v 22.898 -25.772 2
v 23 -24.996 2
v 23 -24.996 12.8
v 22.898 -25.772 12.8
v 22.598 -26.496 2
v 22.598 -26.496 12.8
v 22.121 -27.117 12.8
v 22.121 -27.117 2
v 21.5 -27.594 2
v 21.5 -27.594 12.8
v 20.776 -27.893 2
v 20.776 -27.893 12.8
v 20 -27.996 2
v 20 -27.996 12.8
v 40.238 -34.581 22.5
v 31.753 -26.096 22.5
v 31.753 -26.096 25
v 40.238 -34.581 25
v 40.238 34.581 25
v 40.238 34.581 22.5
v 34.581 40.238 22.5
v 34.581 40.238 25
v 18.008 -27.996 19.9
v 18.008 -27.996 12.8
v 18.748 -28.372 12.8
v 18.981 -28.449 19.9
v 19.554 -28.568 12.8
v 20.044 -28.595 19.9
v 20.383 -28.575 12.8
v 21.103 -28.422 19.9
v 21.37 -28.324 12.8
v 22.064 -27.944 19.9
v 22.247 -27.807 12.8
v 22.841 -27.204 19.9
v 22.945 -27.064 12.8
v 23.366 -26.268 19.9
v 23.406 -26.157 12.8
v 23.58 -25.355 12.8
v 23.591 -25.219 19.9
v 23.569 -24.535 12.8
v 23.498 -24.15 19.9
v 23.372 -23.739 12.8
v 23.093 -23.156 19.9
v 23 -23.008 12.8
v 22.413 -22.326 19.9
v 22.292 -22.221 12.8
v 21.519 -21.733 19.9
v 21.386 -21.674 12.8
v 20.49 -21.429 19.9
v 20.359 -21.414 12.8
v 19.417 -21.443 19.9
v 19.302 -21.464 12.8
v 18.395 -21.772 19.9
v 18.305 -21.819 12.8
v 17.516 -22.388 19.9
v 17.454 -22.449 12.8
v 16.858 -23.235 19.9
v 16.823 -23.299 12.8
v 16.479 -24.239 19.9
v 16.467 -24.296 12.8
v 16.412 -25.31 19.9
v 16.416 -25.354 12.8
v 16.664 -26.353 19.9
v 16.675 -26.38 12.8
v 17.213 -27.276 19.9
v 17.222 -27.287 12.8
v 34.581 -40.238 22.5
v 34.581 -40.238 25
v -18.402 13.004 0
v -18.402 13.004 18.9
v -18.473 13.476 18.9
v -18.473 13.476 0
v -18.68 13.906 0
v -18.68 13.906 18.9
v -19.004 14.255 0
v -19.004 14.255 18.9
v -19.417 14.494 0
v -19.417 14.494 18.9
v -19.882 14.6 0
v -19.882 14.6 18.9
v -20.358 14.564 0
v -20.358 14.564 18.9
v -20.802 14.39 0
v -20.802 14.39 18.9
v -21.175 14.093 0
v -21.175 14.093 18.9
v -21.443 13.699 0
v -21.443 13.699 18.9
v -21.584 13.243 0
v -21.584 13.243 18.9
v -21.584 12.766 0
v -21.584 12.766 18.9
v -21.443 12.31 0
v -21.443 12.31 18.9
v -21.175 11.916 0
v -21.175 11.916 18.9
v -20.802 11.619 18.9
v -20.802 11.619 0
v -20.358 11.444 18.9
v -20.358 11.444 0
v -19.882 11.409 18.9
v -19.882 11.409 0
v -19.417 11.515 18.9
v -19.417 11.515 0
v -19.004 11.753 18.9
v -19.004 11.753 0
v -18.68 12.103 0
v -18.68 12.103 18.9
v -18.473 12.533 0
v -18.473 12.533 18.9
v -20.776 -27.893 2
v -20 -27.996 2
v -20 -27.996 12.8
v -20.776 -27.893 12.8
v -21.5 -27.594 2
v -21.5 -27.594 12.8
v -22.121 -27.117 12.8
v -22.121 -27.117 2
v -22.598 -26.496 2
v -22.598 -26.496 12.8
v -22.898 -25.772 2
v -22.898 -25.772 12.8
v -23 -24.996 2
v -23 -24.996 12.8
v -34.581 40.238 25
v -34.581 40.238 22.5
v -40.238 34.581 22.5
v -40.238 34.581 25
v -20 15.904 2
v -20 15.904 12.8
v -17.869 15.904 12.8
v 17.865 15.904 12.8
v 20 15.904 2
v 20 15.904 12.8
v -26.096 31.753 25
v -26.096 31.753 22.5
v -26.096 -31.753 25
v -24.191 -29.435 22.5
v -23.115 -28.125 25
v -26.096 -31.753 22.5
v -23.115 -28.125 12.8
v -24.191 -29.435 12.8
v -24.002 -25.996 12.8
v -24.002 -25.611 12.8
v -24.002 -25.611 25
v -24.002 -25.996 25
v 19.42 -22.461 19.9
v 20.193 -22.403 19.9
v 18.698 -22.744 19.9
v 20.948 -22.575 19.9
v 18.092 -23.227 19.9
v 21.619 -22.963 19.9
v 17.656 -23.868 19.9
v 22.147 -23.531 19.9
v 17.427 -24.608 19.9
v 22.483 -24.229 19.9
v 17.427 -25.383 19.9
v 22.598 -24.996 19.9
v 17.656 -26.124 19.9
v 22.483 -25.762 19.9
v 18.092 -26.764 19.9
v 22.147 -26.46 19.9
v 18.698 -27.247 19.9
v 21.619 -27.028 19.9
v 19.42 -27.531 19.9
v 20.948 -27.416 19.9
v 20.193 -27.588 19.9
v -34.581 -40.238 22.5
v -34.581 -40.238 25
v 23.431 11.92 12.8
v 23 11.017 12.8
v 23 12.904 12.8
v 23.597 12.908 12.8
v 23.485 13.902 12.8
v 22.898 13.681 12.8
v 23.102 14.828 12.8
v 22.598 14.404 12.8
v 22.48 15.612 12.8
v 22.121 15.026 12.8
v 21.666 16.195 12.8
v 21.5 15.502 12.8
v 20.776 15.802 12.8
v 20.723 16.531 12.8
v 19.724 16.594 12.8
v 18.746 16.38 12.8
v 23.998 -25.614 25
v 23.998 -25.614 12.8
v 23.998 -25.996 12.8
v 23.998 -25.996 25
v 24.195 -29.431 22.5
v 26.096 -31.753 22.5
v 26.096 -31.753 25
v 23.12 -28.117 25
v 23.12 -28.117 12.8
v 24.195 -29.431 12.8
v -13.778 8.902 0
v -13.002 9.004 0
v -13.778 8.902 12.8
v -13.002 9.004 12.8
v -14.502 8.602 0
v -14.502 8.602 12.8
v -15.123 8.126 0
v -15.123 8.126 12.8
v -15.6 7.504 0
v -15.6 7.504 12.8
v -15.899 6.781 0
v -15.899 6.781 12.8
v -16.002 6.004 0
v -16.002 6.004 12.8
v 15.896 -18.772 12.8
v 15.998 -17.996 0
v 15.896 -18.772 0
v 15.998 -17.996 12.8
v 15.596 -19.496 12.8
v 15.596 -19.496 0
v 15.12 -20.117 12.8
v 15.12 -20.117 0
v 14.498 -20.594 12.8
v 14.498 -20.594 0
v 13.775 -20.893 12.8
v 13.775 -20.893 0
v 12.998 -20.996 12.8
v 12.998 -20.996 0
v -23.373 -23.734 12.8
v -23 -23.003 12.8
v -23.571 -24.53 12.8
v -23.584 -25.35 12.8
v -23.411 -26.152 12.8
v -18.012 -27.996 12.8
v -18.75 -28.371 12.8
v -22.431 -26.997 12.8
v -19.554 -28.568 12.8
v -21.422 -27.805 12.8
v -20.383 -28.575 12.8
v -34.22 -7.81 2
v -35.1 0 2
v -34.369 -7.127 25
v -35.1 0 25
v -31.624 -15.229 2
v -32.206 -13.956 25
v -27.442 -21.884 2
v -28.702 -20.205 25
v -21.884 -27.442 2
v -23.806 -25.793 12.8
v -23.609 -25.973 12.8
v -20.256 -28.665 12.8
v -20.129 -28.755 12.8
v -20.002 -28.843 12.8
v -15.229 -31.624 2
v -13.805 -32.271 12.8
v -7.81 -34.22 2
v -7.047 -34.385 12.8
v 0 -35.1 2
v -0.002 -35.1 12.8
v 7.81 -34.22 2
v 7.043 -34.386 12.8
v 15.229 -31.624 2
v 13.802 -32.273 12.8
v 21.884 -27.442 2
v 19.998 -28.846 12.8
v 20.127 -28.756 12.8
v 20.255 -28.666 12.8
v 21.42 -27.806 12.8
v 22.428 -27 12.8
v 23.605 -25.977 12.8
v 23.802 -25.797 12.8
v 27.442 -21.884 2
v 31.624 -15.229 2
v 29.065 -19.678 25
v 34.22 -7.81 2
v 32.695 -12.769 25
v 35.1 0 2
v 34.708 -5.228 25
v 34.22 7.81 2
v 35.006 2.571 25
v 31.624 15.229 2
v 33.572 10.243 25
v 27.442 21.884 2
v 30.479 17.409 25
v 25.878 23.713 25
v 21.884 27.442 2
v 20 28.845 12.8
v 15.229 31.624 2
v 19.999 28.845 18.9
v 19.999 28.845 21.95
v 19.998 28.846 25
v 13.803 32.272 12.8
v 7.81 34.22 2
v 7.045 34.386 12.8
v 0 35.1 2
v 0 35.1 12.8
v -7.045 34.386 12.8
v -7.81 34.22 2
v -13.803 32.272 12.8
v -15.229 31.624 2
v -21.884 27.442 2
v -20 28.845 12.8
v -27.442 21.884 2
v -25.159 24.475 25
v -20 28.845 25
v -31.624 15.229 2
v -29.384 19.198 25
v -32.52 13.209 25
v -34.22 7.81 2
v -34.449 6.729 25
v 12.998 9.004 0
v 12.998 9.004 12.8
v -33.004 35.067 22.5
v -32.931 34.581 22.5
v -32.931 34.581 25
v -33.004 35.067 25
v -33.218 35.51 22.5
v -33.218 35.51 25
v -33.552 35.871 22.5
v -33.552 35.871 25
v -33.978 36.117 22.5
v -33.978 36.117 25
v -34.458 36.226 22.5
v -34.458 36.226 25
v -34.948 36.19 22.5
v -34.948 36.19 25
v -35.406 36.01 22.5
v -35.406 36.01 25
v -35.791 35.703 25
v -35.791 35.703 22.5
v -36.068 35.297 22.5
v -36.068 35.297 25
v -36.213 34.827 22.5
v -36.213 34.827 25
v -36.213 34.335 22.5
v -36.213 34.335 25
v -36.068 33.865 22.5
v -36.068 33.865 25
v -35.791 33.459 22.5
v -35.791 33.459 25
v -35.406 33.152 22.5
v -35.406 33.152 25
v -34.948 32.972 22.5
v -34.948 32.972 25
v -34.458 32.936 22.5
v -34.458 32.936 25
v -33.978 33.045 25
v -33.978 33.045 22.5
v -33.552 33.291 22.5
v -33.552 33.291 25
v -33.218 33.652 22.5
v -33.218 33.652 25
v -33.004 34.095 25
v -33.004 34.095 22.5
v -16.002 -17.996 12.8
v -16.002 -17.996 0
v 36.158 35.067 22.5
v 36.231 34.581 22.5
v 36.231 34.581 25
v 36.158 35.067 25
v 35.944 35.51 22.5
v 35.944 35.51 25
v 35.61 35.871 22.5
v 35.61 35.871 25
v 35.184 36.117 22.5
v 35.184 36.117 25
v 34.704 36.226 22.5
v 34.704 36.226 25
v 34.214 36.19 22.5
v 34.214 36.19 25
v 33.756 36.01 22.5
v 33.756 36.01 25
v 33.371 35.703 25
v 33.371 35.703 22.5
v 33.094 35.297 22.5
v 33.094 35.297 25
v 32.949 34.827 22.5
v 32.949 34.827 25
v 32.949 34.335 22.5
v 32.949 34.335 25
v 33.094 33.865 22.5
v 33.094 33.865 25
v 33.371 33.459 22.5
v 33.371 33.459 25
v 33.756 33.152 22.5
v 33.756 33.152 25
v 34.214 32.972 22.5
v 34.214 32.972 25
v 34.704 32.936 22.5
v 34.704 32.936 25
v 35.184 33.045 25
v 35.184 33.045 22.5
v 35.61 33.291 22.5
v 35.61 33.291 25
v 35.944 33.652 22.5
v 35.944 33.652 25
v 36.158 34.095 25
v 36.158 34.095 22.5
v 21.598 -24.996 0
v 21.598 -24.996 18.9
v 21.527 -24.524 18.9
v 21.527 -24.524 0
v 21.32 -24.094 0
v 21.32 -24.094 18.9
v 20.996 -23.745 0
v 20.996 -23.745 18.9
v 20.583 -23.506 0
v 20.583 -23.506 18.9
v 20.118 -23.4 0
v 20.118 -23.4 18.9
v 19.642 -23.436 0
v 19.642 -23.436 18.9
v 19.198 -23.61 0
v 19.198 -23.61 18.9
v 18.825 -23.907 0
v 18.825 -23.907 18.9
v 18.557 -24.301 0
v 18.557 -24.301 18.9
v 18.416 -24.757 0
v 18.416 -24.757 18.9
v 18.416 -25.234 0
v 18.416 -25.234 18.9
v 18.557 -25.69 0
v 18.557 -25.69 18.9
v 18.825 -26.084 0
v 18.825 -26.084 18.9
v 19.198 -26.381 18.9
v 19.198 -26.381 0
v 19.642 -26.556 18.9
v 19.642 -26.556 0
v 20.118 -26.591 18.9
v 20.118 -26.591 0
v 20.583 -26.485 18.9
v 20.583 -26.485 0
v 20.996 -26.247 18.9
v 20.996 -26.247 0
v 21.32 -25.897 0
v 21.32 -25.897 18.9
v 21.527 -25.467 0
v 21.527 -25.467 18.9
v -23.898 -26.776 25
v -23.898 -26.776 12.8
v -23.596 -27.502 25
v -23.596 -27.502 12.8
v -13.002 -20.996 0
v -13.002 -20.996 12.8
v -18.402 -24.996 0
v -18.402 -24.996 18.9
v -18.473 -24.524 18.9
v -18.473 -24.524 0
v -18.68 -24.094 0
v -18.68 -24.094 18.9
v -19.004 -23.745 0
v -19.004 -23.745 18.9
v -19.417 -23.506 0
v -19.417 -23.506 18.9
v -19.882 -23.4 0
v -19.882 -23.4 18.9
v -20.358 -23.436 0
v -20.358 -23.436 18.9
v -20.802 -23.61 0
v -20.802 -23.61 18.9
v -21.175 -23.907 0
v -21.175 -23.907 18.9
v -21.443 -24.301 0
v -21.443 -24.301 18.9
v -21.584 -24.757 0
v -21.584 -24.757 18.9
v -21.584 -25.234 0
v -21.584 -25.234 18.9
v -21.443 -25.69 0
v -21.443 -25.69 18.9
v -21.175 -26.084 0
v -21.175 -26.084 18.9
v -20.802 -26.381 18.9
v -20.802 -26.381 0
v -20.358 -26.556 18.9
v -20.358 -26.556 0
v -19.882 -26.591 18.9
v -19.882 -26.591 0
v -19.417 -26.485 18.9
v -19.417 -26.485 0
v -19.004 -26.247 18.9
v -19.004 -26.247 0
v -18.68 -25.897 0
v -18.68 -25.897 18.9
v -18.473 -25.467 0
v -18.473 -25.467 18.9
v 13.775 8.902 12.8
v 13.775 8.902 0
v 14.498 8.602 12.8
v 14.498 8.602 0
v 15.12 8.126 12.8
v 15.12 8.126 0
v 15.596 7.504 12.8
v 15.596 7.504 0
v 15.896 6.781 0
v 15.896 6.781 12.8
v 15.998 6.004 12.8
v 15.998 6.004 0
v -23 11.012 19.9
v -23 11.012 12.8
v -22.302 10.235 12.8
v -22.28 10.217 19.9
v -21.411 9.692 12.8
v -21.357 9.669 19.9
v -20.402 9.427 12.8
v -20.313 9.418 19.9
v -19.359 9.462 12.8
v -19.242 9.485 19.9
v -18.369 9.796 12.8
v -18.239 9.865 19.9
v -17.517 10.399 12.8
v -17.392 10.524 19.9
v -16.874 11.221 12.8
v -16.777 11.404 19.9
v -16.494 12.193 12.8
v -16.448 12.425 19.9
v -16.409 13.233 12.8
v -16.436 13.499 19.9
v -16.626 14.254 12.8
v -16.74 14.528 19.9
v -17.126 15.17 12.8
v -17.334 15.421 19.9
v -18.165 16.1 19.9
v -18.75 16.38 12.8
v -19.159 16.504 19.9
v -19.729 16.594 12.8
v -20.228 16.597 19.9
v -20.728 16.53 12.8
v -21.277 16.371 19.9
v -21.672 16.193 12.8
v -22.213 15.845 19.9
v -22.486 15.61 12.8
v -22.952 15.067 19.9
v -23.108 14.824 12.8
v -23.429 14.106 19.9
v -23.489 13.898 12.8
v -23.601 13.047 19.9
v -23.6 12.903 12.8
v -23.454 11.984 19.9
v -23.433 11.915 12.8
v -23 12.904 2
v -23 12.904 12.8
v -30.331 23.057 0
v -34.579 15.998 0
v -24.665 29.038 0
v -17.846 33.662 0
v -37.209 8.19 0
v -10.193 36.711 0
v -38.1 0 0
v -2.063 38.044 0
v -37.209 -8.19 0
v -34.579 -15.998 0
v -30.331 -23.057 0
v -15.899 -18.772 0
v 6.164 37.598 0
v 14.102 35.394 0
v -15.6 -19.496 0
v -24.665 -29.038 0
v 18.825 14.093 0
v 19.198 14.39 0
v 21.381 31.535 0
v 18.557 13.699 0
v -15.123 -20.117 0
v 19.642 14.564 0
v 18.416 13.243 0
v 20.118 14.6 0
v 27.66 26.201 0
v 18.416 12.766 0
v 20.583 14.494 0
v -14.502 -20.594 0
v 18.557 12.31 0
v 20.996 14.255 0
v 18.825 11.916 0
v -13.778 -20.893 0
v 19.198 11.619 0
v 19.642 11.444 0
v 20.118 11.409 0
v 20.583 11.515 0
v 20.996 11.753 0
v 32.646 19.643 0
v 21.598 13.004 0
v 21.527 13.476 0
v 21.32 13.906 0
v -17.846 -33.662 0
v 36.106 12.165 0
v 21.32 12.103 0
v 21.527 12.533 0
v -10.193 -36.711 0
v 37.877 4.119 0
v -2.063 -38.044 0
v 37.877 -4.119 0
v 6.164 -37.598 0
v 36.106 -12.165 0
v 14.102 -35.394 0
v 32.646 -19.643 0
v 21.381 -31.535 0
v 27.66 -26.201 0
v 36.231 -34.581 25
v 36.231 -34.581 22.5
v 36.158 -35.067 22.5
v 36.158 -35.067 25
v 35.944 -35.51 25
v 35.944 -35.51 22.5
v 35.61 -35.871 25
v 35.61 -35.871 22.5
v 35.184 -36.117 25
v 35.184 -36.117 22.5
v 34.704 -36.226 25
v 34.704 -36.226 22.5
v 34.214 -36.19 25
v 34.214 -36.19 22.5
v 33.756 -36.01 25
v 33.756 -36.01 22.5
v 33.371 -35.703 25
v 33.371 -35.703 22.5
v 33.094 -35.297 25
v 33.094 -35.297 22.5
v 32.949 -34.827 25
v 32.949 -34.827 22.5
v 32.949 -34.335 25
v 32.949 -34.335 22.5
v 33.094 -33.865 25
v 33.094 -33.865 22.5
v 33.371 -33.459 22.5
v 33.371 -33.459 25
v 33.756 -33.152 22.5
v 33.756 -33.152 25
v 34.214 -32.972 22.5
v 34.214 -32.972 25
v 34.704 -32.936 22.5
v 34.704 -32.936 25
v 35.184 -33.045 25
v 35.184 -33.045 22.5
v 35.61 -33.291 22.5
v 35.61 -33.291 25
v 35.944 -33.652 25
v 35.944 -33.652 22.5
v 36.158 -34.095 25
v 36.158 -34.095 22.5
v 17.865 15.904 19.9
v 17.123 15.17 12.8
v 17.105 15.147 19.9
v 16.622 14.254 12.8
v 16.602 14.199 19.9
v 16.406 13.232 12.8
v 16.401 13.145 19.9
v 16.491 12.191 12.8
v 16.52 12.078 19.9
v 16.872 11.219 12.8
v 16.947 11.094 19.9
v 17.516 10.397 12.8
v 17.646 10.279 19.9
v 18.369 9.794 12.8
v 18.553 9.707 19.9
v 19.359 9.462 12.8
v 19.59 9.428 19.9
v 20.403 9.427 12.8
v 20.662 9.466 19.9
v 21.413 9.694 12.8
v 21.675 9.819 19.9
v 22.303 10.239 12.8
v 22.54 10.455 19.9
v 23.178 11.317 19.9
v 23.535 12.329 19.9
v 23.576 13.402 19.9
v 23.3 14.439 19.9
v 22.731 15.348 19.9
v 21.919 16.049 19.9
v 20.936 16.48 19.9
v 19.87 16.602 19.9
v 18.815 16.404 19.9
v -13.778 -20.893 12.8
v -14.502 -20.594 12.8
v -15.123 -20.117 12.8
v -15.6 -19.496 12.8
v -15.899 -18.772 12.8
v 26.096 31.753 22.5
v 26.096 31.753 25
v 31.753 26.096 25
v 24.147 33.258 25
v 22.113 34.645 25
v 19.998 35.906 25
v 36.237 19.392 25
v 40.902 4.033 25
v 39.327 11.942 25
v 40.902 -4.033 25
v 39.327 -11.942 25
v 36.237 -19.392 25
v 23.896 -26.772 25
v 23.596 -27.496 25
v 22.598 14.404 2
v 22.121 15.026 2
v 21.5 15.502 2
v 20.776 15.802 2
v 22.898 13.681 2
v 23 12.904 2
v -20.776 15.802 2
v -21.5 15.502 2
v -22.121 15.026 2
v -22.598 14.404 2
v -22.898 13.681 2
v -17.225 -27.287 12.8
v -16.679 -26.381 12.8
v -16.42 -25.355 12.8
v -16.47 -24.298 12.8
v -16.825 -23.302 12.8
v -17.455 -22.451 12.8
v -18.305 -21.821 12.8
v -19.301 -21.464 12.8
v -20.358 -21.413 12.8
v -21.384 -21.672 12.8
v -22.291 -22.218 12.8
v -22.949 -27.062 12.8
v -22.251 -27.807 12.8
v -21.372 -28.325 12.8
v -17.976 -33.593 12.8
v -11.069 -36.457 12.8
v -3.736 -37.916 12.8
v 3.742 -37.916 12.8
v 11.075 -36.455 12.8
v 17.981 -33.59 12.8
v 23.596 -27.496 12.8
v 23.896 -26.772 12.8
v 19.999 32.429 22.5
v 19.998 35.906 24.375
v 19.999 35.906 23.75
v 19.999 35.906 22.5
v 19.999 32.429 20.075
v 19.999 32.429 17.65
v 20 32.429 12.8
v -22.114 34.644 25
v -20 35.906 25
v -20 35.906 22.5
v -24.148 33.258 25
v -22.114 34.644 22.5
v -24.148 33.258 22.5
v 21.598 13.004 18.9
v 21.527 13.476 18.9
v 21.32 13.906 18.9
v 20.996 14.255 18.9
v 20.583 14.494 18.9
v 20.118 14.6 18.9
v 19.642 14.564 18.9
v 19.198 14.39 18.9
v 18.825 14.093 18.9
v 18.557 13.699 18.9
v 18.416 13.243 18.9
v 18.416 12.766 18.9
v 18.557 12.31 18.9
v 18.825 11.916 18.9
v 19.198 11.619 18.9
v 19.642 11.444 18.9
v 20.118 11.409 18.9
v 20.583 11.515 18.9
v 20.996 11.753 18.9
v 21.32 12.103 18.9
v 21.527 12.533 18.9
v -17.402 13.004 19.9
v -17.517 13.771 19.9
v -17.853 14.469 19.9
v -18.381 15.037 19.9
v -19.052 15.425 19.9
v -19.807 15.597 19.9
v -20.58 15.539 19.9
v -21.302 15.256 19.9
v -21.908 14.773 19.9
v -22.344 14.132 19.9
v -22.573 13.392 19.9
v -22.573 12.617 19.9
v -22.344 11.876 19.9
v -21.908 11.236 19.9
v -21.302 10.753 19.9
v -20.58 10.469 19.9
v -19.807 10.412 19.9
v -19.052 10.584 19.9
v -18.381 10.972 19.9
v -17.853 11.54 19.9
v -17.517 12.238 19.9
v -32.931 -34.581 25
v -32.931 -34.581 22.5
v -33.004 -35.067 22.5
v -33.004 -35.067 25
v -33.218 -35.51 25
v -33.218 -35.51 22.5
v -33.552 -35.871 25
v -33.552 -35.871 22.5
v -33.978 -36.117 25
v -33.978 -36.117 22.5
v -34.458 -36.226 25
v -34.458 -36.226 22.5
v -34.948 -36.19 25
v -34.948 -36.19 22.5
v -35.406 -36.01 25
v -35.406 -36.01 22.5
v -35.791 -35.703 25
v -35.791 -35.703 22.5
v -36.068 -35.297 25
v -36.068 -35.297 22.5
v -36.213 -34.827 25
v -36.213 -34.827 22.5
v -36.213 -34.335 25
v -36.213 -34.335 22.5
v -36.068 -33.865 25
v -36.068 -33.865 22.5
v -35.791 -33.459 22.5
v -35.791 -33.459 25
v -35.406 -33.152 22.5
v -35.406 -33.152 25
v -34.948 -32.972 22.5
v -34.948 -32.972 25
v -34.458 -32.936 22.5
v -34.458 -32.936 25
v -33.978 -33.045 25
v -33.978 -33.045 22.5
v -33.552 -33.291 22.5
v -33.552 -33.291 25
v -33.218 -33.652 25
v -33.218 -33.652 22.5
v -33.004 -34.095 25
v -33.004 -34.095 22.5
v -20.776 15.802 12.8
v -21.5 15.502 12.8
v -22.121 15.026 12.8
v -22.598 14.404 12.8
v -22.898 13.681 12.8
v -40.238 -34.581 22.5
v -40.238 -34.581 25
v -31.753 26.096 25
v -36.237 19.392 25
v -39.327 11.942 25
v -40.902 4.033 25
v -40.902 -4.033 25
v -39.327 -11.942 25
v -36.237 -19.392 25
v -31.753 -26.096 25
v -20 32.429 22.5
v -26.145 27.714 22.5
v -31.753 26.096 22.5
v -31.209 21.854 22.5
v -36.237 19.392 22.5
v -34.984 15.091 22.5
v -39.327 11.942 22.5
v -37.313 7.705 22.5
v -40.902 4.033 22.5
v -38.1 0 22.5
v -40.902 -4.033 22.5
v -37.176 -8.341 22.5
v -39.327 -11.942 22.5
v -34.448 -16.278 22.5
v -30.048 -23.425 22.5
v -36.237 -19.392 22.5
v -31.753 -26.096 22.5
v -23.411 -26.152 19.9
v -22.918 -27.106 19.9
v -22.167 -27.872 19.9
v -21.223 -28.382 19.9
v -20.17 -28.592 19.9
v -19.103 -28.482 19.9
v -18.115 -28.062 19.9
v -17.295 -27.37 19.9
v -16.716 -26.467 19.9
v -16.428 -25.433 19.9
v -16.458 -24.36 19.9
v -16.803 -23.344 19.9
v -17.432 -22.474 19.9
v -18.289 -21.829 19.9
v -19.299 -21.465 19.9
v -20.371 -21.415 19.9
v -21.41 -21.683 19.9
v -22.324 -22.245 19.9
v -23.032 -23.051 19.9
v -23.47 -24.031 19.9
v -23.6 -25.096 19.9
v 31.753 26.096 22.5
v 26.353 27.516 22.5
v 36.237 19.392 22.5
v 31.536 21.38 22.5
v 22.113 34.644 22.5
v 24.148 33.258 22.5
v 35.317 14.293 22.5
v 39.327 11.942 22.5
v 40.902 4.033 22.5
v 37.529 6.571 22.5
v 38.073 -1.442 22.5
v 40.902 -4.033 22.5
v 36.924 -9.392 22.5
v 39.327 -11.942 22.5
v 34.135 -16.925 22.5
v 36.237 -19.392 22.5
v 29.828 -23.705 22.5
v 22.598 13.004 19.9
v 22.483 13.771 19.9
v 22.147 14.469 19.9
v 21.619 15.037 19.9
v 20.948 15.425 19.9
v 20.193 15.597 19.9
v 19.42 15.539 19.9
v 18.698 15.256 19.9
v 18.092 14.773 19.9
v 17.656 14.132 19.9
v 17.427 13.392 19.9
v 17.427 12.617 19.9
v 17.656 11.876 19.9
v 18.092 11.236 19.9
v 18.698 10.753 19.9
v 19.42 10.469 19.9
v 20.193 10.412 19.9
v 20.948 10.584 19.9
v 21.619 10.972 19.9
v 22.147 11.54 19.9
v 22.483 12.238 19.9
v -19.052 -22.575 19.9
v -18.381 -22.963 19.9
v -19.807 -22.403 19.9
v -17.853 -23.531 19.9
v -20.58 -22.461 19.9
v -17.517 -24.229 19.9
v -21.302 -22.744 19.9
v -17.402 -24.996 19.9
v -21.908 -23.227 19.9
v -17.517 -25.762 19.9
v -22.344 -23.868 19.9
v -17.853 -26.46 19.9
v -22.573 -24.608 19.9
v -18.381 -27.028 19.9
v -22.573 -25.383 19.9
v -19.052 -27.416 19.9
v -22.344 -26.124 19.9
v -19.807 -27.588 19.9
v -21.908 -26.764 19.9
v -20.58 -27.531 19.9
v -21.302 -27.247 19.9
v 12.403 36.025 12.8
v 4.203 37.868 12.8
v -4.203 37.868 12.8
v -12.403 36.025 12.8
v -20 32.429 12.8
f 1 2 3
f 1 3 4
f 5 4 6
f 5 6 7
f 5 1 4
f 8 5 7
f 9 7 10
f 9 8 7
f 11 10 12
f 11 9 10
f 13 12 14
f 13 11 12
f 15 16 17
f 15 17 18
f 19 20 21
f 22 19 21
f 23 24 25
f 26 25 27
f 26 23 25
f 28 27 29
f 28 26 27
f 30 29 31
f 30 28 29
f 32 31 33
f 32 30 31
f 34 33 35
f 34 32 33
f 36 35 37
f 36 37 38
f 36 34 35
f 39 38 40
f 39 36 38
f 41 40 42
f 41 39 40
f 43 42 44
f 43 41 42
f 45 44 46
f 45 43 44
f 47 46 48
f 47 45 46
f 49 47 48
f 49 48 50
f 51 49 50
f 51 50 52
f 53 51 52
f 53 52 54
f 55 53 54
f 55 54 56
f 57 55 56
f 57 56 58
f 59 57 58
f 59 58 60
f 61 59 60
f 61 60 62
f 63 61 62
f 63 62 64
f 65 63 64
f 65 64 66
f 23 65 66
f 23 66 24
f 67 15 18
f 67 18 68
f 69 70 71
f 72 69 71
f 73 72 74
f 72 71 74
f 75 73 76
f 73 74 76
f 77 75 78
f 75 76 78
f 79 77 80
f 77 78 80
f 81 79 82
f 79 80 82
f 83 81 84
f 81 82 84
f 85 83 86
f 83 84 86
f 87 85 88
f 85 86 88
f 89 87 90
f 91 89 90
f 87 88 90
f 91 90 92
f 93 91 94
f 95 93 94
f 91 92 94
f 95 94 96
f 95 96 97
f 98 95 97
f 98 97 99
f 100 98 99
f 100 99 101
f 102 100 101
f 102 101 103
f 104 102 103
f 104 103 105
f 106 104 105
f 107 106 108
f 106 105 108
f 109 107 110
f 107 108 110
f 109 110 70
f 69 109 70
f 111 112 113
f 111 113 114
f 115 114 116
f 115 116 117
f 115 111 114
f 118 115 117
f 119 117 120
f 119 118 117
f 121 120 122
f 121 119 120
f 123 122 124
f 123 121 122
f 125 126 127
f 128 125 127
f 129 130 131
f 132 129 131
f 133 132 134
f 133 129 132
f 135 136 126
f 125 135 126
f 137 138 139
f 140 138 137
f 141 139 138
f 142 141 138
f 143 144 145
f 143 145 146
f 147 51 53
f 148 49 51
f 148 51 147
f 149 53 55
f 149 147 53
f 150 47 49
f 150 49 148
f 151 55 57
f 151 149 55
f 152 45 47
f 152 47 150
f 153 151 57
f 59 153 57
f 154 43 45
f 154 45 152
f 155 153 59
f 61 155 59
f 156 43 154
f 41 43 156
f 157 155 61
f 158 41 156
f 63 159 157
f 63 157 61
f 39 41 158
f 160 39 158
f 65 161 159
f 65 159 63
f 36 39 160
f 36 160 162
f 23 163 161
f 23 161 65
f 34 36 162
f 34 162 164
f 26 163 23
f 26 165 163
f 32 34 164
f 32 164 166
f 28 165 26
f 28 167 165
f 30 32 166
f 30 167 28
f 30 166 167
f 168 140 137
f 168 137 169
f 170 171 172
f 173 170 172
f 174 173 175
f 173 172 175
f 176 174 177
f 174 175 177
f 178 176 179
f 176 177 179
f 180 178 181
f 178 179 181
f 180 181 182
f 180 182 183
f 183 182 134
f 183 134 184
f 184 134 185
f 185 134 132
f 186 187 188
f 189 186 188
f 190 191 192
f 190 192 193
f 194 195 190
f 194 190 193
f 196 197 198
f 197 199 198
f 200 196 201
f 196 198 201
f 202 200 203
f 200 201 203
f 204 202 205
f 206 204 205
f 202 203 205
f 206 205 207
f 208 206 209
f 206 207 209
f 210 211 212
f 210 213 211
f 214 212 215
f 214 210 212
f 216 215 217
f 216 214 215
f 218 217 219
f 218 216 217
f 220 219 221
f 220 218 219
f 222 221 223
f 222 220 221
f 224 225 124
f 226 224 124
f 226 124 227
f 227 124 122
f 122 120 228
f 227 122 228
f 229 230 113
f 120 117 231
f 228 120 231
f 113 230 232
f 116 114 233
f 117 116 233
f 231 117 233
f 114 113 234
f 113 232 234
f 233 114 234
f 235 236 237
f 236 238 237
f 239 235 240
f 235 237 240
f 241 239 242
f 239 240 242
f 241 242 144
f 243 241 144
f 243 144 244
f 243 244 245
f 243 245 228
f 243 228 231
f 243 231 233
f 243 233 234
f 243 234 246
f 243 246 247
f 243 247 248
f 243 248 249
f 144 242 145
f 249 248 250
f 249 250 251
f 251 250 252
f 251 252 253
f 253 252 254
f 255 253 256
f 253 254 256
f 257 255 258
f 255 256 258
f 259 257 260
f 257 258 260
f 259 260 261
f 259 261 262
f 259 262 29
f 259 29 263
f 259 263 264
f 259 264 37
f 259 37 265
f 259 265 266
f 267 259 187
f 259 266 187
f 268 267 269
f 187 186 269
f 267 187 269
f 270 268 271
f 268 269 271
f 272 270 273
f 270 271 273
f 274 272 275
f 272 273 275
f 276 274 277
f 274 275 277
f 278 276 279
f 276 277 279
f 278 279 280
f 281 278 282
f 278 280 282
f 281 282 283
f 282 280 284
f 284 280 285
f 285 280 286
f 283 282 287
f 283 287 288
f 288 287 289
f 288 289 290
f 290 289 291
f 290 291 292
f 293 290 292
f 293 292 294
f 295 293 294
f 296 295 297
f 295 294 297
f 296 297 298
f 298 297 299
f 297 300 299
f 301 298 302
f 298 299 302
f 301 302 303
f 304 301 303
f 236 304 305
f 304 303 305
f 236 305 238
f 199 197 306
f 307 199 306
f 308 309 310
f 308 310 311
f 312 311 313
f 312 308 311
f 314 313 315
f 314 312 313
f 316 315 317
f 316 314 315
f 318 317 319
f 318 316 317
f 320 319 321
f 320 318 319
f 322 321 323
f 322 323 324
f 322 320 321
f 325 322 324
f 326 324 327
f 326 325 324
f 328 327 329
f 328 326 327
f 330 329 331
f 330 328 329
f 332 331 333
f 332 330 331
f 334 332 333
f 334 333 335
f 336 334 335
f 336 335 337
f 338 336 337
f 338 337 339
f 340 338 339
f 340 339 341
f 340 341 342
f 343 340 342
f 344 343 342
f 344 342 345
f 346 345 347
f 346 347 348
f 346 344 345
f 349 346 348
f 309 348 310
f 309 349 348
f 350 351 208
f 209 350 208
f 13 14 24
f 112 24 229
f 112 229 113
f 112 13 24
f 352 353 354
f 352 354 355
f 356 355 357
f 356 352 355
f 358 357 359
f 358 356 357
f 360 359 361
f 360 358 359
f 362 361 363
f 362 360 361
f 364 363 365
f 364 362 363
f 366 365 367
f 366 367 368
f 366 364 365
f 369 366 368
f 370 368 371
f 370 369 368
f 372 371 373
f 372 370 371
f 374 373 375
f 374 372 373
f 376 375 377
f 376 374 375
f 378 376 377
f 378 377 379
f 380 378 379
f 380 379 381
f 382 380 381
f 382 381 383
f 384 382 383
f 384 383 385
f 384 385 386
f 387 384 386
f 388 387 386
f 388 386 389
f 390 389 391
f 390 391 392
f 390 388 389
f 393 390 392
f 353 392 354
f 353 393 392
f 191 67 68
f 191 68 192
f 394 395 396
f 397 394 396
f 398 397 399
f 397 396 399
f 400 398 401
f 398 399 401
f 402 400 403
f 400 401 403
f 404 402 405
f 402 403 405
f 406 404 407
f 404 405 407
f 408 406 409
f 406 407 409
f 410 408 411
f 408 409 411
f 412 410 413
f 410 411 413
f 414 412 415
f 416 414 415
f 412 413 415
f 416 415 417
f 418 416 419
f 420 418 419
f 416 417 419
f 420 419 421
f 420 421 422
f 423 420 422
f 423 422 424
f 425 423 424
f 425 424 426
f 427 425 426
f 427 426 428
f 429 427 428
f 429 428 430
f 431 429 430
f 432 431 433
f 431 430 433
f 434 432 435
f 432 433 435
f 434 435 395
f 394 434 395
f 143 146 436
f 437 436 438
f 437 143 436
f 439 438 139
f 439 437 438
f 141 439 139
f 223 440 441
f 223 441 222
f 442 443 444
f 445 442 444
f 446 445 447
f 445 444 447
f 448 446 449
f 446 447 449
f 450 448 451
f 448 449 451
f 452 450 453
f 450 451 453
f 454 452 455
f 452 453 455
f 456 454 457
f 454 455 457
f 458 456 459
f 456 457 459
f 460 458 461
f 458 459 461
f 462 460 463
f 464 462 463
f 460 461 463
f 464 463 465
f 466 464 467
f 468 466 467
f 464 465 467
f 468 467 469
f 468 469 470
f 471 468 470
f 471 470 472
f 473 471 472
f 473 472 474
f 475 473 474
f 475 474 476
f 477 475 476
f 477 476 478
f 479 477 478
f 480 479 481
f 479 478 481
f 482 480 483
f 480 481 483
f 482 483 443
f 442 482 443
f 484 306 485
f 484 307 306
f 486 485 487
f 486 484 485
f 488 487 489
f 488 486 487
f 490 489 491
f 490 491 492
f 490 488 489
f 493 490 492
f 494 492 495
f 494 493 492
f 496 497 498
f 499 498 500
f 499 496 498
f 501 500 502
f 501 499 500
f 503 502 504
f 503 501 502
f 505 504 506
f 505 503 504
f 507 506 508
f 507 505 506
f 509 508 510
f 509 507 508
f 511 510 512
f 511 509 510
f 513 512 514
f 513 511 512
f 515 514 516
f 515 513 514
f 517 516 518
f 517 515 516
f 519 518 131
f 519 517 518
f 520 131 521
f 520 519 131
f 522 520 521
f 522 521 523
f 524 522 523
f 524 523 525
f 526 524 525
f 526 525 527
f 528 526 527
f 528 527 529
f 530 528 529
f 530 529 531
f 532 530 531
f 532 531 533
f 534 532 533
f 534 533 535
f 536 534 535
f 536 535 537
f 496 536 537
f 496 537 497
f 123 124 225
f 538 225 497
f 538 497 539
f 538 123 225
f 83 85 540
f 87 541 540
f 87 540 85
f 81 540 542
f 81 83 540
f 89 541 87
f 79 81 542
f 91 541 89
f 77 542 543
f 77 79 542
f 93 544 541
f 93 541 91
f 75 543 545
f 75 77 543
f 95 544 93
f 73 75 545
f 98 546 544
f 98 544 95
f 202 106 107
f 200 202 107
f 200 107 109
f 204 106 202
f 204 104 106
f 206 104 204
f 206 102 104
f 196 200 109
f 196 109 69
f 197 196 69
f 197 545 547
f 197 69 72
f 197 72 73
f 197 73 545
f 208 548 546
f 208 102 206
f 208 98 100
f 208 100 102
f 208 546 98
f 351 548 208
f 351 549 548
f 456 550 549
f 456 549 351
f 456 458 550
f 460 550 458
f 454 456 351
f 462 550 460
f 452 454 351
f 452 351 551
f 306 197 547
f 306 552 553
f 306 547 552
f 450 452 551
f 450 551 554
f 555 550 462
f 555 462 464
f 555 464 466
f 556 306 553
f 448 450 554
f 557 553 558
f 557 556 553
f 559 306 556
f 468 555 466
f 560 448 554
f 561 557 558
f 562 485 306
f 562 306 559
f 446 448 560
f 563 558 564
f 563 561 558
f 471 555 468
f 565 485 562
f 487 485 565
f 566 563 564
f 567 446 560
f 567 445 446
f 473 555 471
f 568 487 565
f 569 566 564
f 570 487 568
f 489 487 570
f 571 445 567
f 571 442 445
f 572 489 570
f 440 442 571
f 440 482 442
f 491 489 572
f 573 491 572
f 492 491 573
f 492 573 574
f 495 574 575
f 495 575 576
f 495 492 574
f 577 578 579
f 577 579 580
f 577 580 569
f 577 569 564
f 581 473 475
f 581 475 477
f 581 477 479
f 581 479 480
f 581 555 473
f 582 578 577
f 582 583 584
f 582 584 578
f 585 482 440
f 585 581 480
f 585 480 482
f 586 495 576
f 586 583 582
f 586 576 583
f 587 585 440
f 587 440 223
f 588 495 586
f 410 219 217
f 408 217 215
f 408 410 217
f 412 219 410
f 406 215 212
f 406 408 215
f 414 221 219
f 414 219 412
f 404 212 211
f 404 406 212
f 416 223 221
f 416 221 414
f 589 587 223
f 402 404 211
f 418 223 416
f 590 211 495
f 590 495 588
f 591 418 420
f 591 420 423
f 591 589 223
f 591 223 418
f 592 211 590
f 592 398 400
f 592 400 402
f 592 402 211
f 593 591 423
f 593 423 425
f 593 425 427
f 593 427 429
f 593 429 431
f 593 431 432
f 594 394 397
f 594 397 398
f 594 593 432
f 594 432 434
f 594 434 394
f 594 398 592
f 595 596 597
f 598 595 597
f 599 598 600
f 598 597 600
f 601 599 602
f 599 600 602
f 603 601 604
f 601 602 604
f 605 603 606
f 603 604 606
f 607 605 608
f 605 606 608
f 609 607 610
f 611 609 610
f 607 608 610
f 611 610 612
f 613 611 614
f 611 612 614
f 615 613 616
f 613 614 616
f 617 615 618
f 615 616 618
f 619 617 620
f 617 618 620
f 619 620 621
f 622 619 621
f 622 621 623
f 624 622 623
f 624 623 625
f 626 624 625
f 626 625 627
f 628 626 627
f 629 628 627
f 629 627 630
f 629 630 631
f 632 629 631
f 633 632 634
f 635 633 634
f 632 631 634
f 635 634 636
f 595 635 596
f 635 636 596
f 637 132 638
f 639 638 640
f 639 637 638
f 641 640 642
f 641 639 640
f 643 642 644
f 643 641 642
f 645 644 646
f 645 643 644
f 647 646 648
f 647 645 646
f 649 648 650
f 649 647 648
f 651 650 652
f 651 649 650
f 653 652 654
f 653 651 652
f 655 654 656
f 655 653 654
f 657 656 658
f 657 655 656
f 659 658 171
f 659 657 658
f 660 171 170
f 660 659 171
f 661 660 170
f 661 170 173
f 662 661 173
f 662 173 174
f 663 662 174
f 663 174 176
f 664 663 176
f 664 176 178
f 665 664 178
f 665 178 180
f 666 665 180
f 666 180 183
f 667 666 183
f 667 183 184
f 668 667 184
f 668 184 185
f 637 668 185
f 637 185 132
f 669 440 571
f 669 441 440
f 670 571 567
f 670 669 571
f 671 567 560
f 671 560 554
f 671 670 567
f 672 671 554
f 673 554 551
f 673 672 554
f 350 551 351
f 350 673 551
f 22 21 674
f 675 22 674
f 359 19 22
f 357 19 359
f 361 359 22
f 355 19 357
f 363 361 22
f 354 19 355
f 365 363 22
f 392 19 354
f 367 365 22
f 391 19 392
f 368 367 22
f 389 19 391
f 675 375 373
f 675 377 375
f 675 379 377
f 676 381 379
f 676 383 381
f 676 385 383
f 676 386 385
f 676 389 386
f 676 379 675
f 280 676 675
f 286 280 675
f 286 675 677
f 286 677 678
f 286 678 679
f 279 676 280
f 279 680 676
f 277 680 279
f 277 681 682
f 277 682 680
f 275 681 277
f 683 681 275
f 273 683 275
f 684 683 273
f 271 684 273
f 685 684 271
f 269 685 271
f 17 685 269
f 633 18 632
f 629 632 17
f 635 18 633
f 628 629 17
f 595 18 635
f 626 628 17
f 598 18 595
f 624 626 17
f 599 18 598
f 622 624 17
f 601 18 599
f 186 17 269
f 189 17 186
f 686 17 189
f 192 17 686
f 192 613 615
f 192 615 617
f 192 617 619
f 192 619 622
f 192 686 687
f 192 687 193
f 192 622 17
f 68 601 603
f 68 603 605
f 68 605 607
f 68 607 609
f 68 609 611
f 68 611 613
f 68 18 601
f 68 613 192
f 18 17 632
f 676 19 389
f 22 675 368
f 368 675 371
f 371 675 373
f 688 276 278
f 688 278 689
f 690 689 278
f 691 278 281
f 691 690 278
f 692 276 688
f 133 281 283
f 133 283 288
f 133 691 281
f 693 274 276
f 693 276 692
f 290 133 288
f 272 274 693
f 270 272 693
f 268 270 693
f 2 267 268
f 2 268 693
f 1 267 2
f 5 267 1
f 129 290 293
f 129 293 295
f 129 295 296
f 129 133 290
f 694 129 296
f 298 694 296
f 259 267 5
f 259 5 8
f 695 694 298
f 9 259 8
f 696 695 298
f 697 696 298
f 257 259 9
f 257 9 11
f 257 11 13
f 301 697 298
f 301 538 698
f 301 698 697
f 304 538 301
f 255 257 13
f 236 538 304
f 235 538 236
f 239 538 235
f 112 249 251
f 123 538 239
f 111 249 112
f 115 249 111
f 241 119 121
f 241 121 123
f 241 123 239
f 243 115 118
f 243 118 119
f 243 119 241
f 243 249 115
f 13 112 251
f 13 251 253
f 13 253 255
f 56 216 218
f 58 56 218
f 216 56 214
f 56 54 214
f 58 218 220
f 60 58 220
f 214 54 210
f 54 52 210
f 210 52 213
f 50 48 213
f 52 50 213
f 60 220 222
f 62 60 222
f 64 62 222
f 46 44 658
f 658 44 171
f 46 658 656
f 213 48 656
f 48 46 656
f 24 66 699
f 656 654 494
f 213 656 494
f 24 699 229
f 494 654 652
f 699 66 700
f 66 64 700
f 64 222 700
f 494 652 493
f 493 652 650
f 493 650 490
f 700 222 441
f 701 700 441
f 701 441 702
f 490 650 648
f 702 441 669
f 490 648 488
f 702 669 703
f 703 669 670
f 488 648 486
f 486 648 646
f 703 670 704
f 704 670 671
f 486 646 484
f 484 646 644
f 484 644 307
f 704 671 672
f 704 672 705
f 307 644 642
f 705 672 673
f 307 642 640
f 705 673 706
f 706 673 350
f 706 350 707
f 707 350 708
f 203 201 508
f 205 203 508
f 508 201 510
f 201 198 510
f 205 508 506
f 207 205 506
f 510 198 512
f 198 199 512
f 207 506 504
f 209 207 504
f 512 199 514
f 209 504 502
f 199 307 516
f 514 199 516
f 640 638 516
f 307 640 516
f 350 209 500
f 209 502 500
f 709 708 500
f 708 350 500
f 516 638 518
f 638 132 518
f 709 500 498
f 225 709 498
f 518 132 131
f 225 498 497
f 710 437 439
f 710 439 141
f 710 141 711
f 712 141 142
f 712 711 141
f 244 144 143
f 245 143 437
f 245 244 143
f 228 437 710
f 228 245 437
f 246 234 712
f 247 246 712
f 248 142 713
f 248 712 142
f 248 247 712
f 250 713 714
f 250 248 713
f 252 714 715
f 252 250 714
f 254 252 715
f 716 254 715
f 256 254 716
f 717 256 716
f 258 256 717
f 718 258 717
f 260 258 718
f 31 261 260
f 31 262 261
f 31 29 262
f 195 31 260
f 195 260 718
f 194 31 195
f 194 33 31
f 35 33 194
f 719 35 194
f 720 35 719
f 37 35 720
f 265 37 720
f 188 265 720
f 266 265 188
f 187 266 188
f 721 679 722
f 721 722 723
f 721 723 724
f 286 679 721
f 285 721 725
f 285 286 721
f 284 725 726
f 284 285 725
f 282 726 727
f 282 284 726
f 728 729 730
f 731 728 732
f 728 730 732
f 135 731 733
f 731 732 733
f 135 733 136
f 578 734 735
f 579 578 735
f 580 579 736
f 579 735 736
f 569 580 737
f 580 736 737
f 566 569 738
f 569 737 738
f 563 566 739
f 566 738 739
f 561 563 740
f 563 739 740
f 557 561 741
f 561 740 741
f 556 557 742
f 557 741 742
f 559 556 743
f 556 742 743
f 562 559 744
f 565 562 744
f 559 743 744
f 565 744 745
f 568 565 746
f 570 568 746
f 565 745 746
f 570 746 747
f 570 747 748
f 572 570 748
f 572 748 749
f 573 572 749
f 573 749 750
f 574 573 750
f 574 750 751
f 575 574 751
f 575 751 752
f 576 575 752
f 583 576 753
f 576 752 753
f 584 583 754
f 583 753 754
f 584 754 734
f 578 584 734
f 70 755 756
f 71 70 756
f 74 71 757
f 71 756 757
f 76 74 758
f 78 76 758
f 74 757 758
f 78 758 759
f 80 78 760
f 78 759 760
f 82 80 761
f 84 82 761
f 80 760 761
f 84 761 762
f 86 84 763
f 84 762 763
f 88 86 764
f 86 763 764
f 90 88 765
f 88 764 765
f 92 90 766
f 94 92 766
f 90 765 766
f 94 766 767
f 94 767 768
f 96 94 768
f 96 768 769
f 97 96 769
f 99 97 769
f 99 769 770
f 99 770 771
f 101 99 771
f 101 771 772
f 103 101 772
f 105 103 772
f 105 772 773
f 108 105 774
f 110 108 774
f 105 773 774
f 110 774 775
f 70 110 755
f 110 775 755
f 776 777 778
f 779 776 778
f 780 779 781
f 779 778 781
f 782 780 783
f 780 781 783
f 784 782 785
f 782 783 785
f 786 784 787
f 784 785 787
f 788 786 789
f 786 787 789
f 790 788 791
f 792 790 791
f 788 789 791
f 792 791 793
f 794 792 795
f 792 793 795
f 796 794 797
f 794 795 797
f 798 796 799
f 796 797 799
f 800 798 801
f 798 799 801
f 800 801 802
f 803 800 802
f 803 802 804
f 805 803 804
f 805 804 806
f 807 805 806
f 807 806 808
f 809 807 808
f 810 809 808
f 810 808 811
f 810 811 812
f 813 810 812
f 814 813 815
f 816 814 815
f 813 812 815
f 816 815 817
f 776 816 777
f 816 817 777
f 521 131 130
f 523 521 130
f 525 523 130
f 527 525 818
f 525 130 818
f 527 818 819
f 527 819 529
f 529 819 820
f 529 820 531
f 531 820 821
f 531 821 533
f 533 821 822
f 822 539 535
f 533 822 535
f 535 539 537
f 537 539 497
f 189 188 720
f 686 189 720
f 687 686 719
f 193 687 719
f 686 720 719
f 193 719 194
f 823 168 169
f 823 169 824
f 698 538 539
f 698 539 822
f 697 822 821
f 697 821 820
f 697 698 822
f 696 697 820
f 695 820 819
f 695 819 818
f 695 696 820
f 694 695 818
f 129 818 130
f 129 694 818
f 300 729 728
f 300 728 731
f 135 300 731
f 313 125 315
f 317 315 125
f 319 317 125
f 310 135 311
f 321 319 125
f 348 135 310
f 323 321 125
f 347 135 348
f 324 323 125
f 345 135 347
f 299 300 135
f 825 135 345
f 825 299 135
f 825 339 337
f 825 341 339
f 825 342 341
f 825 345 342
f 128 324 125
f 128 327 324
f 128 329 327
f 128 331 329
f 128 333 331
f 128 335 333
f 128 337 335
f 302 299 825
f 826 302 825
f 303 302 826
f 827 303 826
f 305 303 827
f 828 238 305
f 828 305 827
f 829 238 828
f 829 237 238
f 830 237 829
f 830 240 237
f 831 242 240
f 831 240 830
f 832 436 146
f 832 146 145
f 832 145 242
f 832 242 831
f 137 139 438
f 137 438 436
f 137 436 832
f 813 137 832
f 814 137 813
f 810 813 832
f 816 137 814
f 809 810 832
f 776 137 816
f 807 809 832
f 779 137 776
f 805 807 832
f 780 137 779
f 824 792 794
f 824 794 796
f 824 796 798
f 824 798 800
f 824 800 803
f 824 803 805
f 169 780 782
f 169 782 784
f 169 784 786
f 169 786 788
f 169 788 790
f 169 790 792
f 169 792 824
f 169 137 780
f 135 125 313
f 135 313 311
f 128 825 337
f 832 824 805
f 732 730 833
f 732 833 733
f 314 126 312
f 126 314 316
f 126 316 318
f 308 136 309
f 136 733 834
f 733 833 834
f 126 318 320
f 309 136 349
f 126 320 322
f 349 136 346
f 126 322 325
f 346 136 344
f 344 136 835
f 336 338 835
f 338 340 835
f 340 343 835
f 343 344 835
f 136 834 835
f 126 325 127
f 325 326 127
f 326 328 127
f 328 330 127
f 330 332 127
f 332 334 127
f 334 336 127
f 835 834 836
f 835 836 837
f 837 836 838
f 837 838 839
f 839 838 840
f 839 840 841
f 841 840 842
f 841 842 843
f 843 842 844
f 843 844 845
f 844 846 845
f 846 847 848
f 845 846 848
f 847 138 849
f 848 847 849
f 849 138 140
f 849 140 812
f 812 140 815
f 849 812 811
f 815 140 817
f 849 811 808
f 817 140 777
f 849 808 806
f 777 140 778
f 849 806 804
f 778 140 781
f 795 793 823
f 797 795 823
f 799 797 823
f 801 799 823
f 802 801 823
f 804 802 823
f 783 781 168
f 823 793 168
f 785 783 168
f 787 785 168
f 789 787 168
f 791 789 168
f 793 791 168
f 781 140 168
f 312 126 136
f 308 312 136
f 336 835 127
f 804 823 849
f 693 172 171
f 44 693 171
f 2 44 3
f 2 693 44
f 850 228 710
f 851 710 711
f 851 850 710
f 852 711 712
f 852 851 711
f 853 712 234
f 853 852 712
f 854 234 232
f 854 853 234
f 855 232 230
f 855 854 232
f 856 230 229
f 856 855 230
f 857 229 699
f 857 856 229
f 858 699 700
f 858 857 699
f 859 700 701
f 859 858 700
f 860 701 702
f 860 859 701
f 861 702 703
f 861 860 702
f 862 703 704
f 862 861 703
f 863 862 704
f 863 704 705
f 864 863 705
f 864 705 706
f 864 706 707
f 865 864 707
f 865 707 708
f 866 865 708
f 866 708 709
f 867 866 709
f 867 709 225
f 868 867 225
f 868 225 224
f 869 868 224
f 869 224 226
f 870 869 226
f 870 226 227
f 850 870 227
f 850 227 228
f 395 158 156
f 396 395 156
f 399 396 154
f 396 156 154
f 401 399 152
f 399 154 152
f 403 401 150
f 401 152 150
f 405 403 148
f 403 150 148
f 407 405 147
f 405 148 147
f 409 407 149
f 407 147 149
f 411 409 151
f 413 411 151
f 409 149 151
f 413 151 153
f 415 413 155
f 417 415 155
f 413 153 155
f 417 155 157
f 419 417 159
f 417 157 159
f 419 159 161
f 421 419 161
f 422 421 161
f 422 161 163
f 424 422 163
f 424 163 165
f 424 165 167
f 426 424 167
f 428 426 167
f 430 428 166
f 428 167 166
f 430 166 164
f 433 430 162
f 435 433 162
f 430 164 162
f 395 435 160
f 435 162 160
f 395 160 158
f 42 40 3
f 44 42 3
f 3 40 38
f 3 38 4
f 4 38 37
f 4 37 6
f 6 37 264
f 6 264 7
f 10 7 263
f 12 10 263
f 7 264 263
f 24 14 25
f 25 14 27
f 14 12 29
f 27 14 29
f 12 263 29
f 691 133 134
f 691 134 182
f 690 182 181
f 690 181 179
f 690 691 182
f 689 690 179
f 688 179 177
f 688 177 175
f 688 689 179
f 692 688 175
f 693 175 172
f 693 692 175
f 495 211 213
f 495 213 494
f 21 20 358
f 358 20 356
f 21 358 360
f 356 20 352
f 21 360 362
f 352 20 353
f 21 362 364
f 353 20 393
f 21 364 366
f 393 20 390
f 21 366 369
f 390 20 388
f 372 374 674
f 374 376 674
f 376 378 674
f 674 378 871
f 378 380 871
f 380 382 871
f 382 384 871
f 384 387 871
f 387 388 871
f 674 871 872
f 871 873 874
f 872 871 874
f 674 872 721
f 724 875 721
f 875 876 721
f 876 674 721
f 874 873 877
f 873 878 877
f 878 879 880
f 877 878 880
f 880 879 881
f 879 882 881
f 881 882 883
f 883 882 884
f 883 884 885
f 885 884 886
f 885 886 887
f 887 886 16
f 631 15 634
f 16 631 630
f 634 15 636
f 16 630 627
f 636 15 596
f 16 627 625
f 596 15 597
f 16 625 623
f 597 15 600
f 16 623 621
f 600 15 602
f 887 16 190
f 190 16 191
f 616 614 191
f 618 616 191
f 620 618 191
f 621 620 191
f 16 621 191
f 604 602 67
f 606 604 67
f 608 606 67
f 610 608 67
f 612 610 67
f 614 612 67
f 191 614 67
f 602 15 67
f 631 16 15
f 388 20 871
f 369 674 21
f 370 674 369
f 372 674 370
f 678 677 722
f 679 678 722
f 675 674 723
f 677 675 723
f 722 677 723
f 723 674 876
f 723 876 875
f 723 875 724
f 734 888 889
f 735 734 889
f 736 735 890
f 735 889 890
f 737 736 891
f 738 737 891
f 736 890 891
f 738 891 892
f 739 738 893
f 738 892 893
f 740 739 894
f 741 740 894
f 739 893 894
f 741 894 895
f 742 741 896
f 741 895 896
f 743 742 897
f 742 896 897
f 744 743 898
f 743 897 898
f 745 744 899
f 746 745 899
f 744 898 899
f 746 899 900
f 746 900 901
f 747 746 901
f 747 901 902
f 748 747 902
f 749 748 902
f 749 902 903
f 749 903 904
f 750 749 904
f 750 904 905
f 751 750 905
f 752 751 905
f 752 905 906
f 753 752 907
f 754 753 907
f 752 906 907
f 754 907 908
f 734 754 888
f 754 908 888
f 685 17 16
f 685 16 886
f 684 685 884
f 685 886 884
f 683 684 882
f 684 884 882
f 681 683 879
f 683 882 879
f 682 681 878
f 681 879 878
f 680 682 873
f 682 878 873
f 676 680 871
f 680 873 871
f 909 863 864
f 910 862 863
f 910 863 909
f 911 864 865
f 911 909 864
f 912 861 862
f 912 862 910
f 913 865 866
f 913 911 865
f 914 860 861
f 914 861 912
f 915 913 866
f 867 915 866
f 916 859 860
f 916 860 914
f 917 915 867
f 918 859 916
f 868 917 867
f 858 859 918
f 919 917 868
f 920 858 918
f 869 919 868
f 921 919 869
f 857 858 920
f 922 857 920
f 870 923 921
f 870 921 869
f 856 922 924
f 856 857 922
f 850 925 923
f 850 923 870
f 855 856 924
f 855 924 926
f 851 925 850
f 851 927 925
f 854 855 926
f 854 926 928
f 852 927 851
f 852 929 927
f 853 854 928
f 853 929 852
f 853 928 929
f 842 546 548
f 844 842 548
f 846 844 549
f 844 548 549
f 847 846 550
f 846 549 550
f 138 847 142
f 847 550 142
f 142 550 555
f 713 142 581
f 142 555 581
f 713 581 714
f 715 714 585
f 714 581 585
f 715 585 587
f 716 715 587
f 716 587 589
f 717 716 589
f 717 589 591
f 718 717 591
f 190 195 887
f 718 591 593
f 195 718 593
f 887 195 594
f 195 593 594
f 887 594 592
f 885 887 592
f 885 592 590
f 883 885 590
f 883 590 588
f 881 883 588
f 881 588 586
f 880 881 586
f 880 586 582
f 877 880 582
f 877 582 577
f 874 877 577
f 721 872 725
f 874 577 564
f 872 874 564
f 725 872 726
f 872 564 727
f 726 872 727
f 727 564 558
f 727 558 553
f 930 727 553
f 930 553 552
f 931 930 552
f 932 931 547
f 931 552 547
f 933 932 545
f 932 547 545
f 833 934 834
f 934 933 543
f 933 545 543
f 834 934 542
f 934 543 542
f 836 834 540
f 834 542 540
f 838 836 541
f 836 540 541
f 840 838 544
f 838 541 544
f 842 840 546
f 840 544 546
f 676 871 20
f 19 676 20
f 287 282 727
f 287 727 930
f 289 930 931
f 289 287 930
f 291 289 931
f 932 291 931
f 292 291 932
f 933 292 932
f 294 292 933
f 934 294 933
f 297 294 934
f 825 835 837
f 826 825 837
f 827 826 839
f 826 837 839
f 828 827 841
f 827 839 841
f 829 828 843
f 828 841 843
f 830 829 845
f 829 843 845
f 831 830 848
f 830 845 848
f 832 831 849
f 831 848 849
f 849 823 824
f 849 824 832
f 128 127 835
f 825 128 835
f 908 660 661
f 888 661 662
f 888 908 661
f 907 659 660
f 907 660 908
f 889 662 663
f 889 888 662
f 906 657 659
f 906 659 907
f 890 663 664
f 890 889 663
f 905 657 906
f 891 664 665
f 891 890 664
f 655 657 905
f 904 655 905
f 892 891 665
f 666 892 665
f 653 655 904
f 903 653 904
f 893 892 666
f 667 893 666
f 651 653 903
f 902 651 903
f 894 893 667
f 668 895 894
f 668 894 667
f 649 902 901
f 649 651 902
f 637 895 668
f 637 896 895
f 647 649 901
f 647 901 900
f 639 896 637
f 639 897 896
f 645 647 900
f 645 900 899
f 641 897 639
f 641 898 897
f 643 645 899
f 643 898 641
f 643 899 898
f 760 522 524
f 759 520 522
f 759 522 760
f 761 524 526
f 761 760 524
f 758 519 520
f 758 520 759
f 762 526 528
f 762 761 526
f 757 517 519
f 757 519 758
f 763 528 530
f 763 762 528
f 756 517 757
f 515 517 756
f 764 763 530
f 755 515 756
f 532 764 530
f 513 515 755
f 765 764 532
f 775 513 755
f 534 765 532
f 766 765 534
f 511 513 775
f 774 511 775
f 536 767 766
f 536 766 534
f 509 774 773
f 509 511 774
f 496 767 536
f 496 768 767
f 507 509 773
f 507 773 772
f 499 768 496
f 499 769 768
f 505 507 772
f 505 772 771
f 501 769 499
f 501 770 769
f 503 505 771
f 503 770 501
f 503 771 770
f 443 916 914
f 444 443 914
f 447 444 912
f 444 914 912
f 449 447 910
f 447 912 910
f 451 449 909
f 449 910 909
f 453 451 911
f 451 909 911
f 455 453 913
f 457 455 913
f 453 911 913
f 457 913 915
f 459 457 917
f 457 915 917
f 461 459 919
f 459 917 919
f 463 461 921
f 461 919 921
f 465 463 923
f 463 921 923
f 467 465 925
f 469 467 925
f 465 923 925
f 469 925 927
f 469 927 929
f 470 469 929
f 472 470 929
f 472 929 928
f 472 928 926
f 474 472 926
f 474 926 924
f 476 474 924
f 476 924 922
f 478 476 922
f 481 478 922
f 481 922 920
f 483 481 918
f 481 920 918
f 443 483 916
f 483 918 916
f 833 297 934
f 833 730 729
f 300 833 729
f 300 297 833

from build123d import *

# Parameters (mm, degrees)
BOSS_EXTRUDE1_DEPTH     = 10.8
CUT_EXTRUDE1_DEPTH      = 63.509359299
CUT_EXTRUDE1_DEPTH_BACK = 63.509359299
SKETCH14_W              = 32
SKETCH14_H              = 30
CUT_EXTRUDE3_DEPTH      = 60.51688836
FILLET1_R               = 3
SKETCH16_R              = 1.6
CUT_EXTRUDE2_DEPTH      = 60.51688836
CUT_EXTRUDE4_DEPTH      = 75.590213715
BOSS_EXTRUDE3_START     = -2.5
SKETCH22_R              = 1.65
BOSS_EXTRUDE3_DEPTH     = 2.5
BOSS_EXTRUDE4_START     = 7.1
SKETCH24_R              = 3.6
SKETCH24_R_2            = 1.6
BOSS_EXTRUDE4_DEPTH     = 7.1
CHAMFER1_SIZE           = 1
CUT_EXTRUDE5_START      = -12.2
CUT_EXTRUDE5_DEPTH      = 12.2


# Read off the part's stored shape, not the designer's step: Cut-Extrude5
with BuildPart() as part:
    # Sketch6 → Revolve1 (revolve)
    with BuildSketch(Plane(origin=(0, 0, 0), x_dir=(0, 0, -1), z_dir=(1, 0, 0)), mode=Mode.PRIVATE) as revolve1_sk:
        Polygon((-2, 25.4), (-2, 35.1), (-25, 35.1), (-25, 37.95), (-25, 41.1), (-22.5, 41.1), (-22.5, 38.1), (0, 38.1), (0, 25.4), (0, 0), (-2, 0), align=None)
    revolve(revolve1_sk.sketch.rotate(Axis((0, 0, 0), (0, 0, 1)), 90), axis=Axis((0, 0, 0), (0, 0, 1)))

    # Sketch15 → Boss-Extrude1 (add)
    with BuildSketch(Plane.XY.offset(2)):
        with BuildLine():
            Line((-20, 15.904297927), (20, 15.904297927))
            ThreePointArc((20, 15.904297927), (22.121320344, 15.02561827), (23, 12.904297927))
            Line((23, 12.904297927), (23, -24.995702073))
            ThreePointArc((23, -24.995702073), (22.121320344, -27.117022417), (20, -27.995702073))
            Line((20, -27.995702073), (-20, -27.995702073))
            ThreePointArc((-20, -27.995702073), (-22.121320344, -27.117022417), (-23, -24.995702073))
            Line((-23, -24.995702073), (-23, 12.904297927))
            ThreePointArc((-23, 12.904297927), (-22.121320344, 15.02561827), (-20, 15.904297927))
        make_face()
    extrude(amount=BOSS_EXTRUDE1_DEPTH)

    # Sketch14 → Cut-Extrude1 (cut, two sides: drawn at the far end of the back side and taken through both)
    with BuildSketch(Plane.XY.offset(2).offset(-CUT_EXTRUDE1_DEPTH_BACK)):
        with Locations((-0.00164643, -5.995702073)):
            Rectangle(SKETCH14_W, SKETCH14_H)
    extrude(amount=CUT_EXTRUDE1_DEPTH + CUT_EXTRUDE1_DEPTH_BACK, mode=Mode.SUBTRACT)

    # Sketch18 → Cut-Extrude3 (cut, through all)
    with BuildSketch(Plane.XY.offset(12.8)):
        with BuildLine():
            Line((19.99835357, -24.995702073), (23.99835357, -24.995702073))
            Line((23.99835357, -24.995702073), (23.99835357, -25.995702073))
            ThreePointArc((23.99835357, -25.995702073), (23.119673914, -28.117022417), (20.99835357, -28.995702073))
            Line((20.99835357, -28.995702073), (19.99835357, -28.995702073))
            Line((19.99835357, -28.995702073), (19.99835357, -24.995702073))
        make_face()
        with BuildLine():
            Line((-20.00164643, -24.995702073), (-24.00164643, -24.995702073))
            Line((-24.00164643, -24.995702073), (-24.00164643, -25.995702073))
            ThreePointArc((-24.00164643, -25.995702073), (-23.122966774, -28.117022417), (-21.00164643, -28.995702073))
            Line((-21.00164643, -28.995702073), (-20.00164643, -28.995702073))
            Line((-20.00164643, -28.995702073), (-20.00164643, -24.995702073))
        make_face()
    extrude(amount=CUT_EXTRUDE3_DEPTH, mode=Mode.SUBTRACT)

    # Fillet1
    fillet1_edges = [part.edges().sort_by_distance(p)[0] for p in [
        (-16.00164643, 9.004297927, 6.4),
        (-16.00164643, -20.995702073, 6.4),
        (15.99835357, -20.995702073, 6.4),
        (15.99835357, 9.004297927, 6.4),
    ]]
    fillet(fillet1_edges, radius=FILLET1_R)

    # Sketch16 → Cut-Extrude2 (cut, through all)
    with BuildSketch(Plane.XY.offset(12.8)):
        with Locations((-20.00164643, 13.004297927)):
            Circle(SKETCH16_R)
        with Locations((-20.00164643, -24.995702073)):
            Circle(SKETCH16_R)
        with Locations((19.99835357, -24.995702073)):
            Circle(SKETCH16_R)
        with Locations((19.99835357, 13.004297927)):
            Circle(SKETCH16_R)
    extrude(amount=-CUT_EXTRUDE2_DEPTH, mode=Mode.SUBTRACT)

    # Sketch20 → Cut-Extrude4 (cut, through all)
    with BuildSketch(Plane(origin=(0, 15.904297927, 0), x_dir=(1, 0, 0), z_dir=(0, 1, 0))):
        Polygon((20, -12.8), (-20, -12.8), (-20, -25), (19.99835357, -25), align=None)
    extrude(amount=CUT_EXTRUDE4_DEPTH, mode=Mode.SUBTRACT)

    # Sketch22 → Boss-Extrude3 (add)
    # profile 1 of 2: a face of its own
    with BuildSketch(Plane.XY.offset(25).offset(BOSS_EXTRUDE3_START)):
        with BuildLine():
            Line((-40.237833378, 34.580979128), (-31.752552003, 26.095697754))
            ThreePointArc((-31.752552003, 26.095697754), (-29.062088707, 29.062088707), (-26.095697754, 31.752552003))
            Line((-26.095697754, 31.752552003), (-34.580979128, 40.237833378))
            Line((-34.580979128, 40.237833378), (-40.237833378, 34.580979128))
        make_face()
        with Locations((-34.580979128, 34.580979128)):
            Circle(SKETCH22_R, mode=Mode.SUBTRACT)
    # profile 2 of 2: a face of its own
    with BuildSketch(Plane.XY.offset(25).offset(BOSS_EXTRUDE3_START)):
        with BuildLine():
            ThreePointArc((26.095697754, 31.752552003), (29.062088707, 29.062088707), (31.752552003, 26.095697754))
            Line((31.752552003, 26.095697754), (40.237833378, 34.580979128))
            Line((40.237833378, 34.580979128), (34.580979128, 40.237833378))
            Line((34.580979128, 40.237833378), (26.095697754, 31.752552003))
        make_face()
        with Locations((34.580979128, 34.580979128)):
            Circle(SKETCH22_R, mode=Mode.SUBTRACT)
    boss_extrude3 = extrude(amount=BOSS_EXTRUDE3_DEPTH)

    # Sketch24 → Boss-Extrude4 (add)
    # profile 1 of 4: a face of its own
    with BuildSketch(Plane.XY.offset(12.8).offset(BOSS_EXTRUDE4_START)):
        with Locations(Location((-20.00164643, 13.004297927, 0), (0, 0, 213.6046846))):
            Circle(SKETCH24_R)
        with Locations((-20.00164643, 13.004297927)):
            Circle(SKETCH24_R_2, mode=Mode.SUBTRACT)
    # profile 2 of 4: a face of its own
    with BuildSketch(Plane.XY.offset(12.8).offset(BOSS_EXTRUDE4_START)):
        with Locations(Location((19.99835357, 13.004297927, 0), (0, 0, 126.336057515))):
            Circle(SKETCH24_R)
        with Locations((19.99835357, 13.004297927)):
            Circle(SKETCH24_R_2, mode=Mode.SUBTRACT)
    # profile 3 of 4: a face of its own
    with BuildSketch(Plane.XY.offset(12.8).offset(BOSS_EXTRUDE4_START)):
        with Locations(Location((-20.00164643, -24.995702073, 0), (0, 0, 198.741091164))):
            Circle(SKETCH24_R)
        with Locations((-20.00164643, -24.995702073)):
            Circle(SKETCH24_R_2, mode=Mode.SUBTRACT)
    # profile 4 of 4: a face of its own
    with BuildSketch(Plane.XY.offset(12.8).offset(BOSS_EXTRUDE4_START)):
        with Locations(Location((19.99835357, -24.995702073, 0), (0, 0, 236.442690237))):
            Circle(SKETCH24_R)
        with Locations((19.99835357, -24.995702073)):
            Circle(SKETCH24_R_2, mode=Mode.SUBTRACT)
    extrude(amount=-BOSS_EXTRUDE4_DEPTH)

    # Chamfer1
    chamfer1_edges = [part.edges().sort_by_distance(p)[0] for p in [
        (-21.60164643, 13.004297927, 19.9),
        (18.39835357, 13.004297927, 19.9),
        (-21.60164643, -24.995702073, 19.9),
        (18.39835357, -24.995702073, 19.9),
    ]]
    chamfer(chamfer1_edges, length=CHAMFER1_SIZE)

    # Mirror1: Boss-Extrude3 across plane
    add(boss_extrude3.mirror(Plane.ZX))

    # Cut-Extrude5 outline → Cut-Extrude5 (cut)
    with BuildSketch(Plane.XY.offset(25).offset(CUT_EXTRUDE5_START)):
        with BuildLine():
            ThreePointArc((-26.095697754, -31.752552003), (0, -41.1), (26.095697754, -31.752552003))
            Line((26.095697754, -31.752552003), (23.119673914, -28.117022417))
            ThreePointArc((23.119673914, -28.117022417), (22.146403867, -28.767340671), (20.99835357, -28.995702073))
            Line((20.99835357, -28.995702073), (19.99835357, -28.995702073))
            Line((19.99835357, -28.995702073), (19.99835357, -28.845725064))
            ThreePointArc((19.99835357, -28.845725064), (-0.002003485, -35.099999943), (-20.00164643, -28.843441891))
            Line((-20.00164643, -28.843441891), (-20.00164643, -28.995702073))
            Line((-20.00164643, -28.995702073), (-21.00164643, -28.995702073))
            ThreePointArc((-21.00164643, -28.995702073), (-22.144276194, -28.769579725), (-23.11465654, -28.125300222))
            Line((-23.11465654, -28.125300222), (-26.095697754, -31.752552003))
        make_face()
    extrude(amount=CUT_EXTRUDE5_DEPTH, mode=Mode.SUBTRACT)


solid = part.part
